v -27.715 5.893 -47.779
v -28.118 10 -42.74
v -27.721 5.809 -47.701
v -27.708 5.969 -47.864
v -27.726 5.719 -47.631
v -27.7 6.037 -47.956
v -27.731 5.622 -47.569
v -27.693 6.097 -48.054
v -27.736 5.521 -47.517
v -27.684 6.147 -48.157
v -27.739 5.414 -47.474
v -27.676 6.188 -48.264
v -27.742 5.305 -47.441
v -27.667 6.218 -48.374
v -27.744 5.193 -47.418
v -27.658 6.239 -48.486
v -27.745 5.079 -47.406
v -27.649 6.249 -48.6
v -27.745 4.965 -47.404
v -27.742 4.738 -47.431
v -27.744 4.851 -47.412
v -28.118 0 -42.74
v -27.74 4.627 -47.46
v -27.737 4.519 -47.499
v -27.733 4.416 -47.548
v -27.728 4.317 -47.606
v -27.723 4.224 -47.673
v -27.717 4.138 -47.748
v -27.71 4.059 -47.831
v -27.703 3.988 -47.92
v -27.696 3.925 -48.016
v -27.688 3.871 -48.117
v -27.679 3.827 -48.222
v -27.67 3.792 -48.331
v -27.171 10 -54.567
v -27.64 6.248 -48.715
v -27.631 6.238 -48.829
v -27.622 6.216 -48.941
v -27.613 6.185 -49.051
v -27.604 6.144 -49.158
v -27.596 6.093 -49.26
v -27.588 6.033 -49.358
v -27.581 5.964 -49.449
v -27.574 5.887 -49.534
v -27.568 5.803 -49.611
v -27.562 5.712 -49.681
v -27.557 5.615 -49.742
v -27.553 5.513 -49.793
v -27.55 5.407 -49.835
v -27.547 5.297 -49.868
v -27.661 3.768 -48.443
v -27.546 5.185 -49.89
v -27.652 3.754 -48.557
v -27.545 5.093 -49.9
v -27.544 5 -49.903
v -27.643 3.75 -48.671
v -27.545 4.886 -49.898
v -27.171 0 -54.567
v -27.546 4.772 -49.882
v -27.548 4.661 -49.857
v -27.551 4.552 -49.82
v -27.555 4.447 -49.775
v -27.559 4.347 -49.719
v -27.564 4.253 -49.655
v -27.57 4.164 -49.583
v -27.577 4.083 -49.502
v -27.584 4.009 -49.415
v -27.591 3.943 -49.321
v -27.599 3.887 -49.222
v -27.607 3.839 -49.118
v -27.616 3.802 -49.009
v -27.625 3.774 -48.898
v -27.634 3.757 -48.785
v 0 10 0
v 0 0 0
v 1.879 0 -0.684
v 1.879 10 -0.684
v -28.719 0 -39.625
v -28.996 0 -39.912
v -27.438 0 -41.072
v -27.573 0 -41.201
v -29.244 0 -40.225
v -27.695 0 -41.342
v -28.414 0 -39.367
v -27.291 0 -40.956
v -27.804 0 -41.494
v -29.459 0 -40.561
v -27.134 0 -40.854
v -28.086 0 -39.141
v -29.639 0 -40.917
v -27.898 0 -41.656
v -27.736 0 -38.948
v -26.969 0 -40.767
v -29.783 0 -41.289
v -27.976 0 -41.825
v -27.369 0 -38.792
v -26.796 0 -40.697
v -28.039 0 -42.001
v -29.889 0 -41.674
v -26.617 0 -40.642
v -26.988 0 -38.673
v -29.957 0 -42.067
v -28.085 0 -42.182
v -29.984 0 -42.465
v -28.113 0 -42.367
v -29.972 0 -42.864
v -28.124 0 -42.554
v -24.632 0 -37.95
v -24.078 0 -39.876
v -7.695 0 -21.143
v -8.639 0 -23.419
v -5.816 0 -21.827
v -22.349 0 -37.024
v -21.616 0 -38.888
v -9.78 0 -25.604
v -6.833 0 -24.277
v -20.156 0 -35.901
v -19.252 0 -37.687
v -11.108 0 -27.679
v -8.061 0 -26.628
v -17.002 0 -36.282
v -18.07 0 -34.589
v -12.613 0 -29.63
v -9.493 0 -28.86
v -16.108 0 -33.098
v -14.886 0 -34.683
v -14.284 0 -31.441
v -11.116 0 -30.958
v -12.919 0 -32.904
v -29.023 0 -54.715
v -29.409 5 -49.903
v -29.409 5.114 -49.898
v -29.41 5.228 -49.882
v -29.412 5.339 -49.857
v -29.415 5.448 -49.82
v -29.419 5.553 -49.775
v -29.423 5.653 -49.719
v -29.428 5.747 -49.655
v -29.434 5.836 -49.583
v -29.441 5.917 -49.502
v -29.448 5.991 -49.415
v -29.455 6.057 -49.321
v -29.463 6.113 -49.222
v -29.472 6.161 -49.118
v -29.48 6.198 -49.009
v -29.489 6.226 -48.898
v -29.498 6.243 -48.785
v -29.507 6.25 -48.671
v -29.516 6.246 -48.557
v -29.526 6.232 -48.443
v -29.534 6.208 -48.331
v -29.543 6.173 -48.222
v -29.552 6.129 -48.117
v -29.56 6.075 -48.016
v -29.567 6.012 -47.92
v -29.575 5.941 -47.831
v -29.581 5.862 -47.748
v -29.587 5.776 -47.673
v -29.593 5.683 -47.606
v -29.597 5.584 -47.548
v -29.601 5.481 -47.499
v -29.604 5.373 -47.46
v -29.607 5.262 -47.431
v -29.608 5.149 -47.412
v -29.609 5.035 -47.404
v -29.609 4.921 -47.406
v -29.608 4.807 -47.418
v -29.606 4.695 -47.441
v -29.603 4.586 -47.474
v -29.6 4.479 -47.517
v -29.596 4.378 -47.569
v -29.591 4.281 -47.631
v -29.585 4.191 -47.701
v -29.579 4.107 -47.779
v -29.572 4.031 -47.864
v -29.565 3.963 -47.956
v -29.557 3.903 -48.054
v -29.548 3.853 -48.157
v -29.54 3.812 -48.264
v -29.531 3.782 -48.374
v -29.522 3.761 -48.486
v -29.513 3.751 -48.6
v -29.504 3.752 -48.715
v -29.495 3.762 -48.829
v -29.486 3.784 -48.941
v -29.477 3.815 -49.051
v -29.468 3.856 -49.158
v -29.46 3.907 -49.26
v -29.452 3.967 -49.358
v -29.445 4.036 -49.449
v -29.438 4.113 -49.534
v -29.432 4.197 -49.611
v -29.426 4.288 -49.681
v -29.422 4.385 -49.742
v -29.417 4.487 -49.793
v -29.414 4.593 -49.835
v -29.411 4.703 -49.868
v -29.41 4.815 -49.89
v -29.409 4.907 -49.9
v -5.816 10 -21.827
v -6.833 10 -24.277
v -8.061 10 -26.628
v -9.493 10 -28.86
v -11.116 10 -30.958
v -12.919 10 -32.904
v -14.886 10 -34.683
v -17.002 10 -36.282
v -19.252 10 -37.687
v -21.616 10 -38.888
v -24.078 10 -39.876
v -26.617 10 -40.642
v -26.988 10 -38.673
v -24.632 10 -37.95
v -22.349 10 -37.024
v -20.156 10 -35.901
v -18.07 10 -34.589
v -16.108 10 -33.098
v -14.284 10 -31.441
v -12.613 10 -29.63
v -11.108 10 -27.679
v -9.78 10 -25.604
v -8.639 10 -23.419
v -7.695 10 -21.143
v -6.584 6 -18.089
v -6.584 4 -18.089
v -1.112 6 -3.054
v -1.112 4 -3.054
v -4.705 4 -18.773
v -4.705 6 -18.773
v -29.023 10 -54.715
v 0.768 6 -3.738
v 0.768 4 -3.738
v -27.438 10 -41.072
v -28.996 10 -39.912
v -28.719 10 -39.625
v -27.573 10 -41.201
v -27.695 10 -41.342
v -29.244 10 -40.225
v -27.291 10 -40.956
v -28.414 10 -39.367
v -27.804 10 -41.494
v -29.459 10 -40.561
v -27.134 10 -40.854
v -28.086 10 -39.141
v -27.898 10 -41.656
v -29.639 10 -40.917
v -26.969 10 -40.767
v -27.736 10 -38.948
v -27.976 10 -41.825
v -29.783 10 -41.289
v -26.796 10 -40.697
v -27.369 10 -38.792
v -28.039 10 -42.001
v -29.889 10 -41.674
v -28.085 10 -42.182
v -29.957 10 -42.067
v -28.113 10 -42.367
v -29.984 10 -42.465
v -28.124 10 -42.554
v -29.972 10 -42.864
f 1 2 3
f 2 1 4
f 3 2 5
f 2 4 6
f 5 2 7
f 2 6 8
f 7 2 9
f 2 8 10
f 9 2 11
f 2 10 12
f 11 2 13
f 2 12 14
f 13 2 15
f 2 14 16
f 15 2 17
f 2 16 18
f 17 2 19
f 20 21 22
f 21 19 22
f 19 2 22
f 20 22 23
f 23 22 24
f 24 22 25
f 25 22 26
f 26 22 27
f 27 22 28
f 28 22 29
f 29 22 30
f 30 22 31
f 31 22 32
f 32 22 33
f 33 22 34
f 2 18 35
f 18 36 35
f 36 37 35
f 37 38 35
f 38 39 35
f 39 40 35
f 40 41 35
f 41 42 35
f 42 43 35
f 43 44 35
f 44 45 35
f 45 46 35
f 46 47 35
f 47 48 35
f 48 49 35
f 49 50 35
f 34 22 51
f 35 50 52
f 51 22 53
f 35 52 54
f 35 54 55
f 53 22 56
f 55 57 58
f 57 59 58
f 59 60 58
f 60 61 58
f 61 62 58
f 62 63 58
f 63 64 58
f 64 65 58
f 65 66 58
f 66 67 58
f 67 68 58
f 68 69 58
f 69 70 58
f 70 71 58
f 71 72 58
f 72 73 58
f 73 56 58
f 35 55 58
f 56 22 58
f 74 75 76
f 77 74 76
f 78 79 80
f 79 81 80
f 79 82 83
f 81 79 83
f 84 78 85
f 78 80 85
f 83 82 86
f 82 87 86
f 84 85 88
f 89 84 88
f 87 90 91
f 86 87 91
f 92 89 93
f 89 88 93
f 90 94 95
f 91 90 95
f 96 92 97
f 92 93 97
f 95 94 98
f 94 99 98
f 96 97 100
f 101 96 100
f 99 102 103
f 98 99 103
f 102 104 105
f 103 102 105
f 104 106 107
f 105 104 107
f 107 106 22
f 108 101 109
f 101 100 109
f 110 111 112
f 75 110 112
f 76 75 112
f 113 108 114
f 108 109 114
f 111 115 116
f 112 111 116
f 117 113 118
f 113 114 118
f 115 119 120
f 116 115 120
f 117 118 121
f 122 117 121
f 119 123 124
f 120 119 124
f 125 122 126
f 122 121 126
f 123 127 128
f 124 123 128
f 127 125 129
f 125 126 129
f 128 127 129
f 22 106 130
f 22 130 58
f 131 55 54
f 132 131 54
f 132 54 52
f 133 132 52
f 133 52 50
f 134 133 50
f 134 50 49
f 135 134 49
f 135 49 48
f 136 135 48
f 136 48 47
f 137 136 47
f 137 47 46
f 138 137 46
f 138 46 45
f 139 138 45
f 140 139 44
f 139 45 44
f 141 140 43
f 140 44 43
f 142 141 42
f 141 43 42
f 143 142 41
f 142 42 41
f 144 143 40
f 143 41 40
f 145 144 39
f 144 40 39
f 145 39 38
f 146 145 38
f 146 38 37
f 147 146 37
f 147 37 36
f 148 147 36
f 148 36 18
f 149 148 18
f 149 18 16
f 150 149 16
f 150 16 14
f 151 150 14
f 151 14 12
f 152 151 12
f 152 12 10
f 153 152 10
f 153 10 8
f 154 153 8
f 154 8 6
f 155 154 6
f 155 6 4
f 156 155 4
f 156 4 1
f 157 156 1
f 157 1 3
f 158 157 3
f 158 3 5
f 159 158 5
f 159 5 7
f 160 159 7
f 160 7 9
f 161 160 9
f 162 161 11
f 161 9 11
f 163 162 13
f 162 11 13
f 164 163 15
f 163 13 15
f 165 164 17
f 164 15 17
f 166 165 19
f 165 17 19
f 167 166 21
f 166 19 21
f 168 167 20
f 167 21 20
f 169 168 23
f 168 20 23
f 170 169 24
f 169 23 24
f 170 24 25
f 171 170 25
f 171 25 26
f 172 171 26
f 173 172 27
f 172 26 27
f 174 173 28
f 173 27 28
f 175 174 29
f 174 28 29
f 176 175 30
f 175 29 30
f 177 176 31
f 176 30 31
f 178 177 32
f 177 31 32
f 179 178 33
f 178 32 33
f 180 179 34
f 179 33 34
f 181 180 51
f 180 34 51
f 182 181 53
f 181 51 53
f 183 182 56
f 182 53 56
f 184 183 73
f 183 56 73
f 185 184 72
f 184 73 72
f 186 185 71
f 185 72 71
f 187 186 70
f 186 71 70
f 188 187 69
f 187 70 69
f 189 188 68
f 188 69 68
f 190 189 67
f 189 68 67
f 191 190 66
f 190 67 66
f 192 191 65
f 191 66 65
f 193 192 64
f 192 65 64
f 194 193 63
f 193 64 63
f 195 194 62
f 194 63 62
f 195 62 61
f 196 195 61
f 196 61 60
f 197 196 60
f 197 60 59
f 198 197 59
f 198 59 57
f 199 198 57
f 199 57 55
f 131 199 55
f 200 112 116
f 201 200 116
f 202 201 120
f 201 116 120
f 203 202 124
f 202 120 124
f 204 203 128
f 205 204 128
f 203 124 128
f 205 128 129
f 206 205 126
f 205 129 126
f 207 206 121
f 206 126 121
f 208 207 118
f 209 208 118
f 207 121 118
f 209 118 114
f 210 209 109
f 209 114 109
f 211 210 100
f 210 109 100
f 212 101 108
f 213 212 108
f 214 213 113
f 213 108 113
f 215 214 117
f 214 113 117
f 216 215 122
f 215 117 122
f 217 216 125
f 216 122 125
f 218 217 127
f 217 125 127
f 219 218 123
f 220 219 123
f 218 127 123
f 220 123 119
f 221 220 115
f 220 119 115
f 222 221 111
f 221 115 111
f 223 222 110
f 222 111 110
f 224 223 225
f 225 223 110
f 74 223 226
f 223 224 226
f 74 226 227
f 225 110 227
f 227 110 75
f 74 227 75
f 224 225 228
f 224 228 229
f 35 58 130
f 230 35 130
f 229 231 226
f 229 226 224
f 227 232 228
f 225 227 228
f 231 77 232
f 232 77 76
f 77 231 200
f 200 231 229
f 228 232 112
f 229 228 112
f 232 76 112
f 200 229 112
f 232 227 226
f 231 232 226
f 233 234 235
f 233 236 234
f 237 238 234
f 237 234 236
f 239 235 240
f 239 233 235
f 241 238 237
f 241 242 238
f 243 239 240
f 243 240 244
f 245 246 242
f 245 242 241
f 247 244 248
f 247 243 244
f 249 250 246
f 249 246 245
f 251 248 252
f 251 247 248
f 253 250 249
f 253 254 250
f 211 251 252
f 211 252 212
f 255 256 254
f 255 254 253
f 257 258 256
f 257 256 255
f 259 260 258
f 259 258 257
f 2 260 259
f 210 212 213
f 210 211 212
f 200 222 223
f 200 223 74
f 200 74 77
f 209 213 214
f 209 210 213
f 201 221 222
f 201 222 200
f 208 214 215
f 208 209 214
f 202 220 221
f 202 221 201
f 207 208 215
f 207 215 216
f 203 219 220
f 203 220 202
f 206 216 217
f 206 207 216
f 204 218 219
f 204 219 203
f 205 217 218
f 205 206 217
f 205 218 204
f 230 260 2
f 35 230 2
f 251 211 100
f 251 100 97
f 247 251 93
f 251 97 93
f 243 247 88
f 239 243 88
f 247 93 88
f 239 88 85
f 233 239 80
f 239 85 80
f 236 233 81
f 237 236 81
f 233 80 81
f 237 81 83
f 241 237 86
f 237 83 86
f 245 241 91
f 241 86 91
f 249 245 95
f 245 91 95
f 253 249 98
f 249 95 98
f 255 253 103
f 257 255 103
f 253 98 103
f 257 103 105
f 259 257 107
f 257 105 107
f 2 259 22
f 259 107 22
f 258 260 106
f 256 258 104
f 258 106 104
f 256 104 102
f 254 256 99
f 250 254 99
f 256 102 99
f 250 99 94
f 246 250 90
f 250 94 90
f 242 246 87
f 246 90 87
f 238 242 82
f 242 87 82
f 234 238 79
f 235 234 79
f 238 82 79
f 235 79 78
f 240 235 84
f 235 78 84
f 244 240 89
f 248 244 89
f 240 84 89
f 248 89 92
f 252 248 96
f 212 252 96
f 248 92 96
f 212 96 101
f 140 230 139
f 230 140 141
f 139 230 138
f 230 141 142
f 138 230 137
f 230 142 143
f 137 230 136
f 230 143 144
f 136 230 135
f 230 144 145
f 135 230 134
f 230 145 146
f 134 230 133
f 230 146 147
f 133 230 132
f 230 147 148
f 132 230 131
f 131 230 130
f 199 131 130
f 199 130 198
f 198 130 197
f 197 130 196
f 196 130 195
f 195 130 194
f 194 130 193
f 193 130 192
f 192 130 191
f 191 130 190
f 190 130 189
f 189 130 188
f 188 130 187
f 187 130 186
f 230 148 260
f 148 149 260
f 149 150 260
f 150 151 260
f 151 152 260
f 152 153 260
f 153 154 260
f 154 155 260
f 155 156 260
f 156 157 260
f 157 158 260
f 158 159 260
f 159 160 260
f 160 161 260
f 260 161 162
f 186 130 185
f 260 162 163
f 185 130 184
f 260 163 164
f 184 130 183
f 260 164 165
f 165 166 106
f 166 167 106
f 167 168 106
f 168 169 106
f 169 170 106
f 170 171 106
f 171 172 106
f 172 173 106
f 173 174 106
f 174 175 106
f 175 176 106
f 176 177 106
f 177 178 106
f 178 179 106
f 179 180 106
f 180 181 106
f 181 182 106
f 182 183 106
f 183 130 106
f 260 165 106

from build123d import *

# Parameters (mm, degrees)
EXTRUDE_1_DEPTH     = 10
SKETCH_2_R          = 1.25
CUT_EXTRUDE_1_DEPTH = 64.188882811
SKETCH_3_W          = 16
SKETCH_3_H          = 2
CUT_EXTRUDE_2_DEPTH = 10


with BuildPart() as part:
    # Эскиз1 → Бобышка-Вытянуть1 (new body)
    with BuildSketch(Plane(origin=(0, 0, 0), x_dir=(1, 0, 0), z_dir=(0, 1, 0))):
        with BuildLine():
            Line((-28.118262676, 42.740270437), (-27.170876932, 54.566519955))
            Line((-27.170876932, 54.566519955), (-29.023121545, 54.714900905))
            Line((-29.023121545, 54.714900905), (-29.972465165, 42.864211138))
            ThreePointArc((-29.972465165, 42.864211138), (-29.243677502, 40.224761685), (-26.987939543, 38.672514561))
            ThreePointArc((-26.987939543, 38.672514561), (-15.177415755, 32.289756522), (-7.695453225, 21.143083968))
            Line((-7.695453225, 21.143083968), (0, 0))
            Line((0, 0), (1.879385242, 0.684040287))
            Line((1.879385242, 0.684040287), (-5.816067983, 21.827124254))
            ThreePointArc((-5.816067983, 21.827124254), (-13.882439346, 33.815300424), (-26.617286688, 40.642186829))
            ThreePointArc((-26.617286688, 40.642186829), (-27.751256034, 41.416884799), (-28.118262676, 42.740270437))
        make_face()
    extrude(amount=EXTRUDE_1_DEPTH)

    # Эскиз2 → Вырез-Вытянуть1 (cut, through all)
    with BuildSketch(Plane(origin=(0, 0, 0), x_dir=(0, 0, -1), z_dir=(1, 0, 0))):
        with Locations((48.653395196, 5)):
            Circle(SKETCH_2_R)
    extrude(amount=-CUT_EXTRUDE_1_DEPTH, mode=Mode.SUBTRACT)

    # Эскиз3 → Вырез-Вытянуть2 (cut)
    with BuildSketch(Plane(origin=(1.879385242, 0, -0.684040287), x_dir=(-0.34202014332566943, 0, -0.9396926207859082), z_dir=(0.9396926207859082, 0, -0.34202014332566943))):
        with Locations((11.25, 5)):
            Rectangle(SKETCH_3_W, SKETCH_3_H)
    extrude(amount=-CUT_EXTRUDE_2_DEPTH, mode=Mode.SUBTRACT)


solid = part.part
